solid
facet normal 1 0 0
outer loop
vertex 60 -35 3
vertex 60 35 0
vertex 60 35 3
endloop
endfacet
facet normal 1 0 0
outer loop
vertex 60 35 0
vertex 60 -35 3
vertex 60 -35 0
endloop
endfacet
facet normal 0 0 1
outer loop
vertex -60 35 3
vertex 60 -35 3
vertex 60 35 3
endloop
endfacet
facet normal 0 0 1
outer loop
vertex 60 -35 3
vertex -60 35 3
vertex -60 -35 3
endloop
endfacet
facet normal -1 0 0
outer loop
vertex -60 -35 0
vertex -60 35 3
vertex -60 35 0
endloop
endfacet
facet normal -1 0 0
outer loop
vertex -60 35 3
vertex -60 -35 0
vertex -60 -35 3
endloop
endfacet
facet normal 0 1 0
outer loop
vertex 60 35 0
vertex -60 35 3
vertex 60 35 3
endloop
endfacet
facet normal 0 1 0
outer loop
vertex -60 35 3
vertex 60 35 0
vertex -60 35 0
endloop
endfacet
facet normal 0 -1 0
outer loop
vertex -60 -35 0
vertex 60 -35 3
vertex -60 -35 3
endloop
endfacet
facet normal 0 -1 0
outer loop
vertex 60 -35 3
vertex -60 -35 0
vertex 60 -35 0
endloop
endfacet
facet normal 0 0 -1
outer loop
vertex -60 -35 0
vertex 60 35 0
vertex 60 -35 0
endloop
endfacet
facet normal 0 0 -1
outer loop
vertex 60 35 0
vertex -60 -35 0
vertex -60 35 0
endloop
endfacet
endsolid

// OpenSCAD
// Built by bench/smallmodels/features/compiler.py from a list of features.
$fn = 64;
difference() {
  union() {
    translate([0, 0, 0]) translate([-60, -35, 0]) cube([120, 70, 40]);
  }
  union() {
    translate([0, 0, 3]) rotate([0, 0, 0]) translate([-60, -35, 0]) cube([120, 70, 37]);
    translate([-6, -32, 3]) rotate([0, 0, 0]) translate([-57, -32, 0]) cube([114, 64, 37]);
  }
}
